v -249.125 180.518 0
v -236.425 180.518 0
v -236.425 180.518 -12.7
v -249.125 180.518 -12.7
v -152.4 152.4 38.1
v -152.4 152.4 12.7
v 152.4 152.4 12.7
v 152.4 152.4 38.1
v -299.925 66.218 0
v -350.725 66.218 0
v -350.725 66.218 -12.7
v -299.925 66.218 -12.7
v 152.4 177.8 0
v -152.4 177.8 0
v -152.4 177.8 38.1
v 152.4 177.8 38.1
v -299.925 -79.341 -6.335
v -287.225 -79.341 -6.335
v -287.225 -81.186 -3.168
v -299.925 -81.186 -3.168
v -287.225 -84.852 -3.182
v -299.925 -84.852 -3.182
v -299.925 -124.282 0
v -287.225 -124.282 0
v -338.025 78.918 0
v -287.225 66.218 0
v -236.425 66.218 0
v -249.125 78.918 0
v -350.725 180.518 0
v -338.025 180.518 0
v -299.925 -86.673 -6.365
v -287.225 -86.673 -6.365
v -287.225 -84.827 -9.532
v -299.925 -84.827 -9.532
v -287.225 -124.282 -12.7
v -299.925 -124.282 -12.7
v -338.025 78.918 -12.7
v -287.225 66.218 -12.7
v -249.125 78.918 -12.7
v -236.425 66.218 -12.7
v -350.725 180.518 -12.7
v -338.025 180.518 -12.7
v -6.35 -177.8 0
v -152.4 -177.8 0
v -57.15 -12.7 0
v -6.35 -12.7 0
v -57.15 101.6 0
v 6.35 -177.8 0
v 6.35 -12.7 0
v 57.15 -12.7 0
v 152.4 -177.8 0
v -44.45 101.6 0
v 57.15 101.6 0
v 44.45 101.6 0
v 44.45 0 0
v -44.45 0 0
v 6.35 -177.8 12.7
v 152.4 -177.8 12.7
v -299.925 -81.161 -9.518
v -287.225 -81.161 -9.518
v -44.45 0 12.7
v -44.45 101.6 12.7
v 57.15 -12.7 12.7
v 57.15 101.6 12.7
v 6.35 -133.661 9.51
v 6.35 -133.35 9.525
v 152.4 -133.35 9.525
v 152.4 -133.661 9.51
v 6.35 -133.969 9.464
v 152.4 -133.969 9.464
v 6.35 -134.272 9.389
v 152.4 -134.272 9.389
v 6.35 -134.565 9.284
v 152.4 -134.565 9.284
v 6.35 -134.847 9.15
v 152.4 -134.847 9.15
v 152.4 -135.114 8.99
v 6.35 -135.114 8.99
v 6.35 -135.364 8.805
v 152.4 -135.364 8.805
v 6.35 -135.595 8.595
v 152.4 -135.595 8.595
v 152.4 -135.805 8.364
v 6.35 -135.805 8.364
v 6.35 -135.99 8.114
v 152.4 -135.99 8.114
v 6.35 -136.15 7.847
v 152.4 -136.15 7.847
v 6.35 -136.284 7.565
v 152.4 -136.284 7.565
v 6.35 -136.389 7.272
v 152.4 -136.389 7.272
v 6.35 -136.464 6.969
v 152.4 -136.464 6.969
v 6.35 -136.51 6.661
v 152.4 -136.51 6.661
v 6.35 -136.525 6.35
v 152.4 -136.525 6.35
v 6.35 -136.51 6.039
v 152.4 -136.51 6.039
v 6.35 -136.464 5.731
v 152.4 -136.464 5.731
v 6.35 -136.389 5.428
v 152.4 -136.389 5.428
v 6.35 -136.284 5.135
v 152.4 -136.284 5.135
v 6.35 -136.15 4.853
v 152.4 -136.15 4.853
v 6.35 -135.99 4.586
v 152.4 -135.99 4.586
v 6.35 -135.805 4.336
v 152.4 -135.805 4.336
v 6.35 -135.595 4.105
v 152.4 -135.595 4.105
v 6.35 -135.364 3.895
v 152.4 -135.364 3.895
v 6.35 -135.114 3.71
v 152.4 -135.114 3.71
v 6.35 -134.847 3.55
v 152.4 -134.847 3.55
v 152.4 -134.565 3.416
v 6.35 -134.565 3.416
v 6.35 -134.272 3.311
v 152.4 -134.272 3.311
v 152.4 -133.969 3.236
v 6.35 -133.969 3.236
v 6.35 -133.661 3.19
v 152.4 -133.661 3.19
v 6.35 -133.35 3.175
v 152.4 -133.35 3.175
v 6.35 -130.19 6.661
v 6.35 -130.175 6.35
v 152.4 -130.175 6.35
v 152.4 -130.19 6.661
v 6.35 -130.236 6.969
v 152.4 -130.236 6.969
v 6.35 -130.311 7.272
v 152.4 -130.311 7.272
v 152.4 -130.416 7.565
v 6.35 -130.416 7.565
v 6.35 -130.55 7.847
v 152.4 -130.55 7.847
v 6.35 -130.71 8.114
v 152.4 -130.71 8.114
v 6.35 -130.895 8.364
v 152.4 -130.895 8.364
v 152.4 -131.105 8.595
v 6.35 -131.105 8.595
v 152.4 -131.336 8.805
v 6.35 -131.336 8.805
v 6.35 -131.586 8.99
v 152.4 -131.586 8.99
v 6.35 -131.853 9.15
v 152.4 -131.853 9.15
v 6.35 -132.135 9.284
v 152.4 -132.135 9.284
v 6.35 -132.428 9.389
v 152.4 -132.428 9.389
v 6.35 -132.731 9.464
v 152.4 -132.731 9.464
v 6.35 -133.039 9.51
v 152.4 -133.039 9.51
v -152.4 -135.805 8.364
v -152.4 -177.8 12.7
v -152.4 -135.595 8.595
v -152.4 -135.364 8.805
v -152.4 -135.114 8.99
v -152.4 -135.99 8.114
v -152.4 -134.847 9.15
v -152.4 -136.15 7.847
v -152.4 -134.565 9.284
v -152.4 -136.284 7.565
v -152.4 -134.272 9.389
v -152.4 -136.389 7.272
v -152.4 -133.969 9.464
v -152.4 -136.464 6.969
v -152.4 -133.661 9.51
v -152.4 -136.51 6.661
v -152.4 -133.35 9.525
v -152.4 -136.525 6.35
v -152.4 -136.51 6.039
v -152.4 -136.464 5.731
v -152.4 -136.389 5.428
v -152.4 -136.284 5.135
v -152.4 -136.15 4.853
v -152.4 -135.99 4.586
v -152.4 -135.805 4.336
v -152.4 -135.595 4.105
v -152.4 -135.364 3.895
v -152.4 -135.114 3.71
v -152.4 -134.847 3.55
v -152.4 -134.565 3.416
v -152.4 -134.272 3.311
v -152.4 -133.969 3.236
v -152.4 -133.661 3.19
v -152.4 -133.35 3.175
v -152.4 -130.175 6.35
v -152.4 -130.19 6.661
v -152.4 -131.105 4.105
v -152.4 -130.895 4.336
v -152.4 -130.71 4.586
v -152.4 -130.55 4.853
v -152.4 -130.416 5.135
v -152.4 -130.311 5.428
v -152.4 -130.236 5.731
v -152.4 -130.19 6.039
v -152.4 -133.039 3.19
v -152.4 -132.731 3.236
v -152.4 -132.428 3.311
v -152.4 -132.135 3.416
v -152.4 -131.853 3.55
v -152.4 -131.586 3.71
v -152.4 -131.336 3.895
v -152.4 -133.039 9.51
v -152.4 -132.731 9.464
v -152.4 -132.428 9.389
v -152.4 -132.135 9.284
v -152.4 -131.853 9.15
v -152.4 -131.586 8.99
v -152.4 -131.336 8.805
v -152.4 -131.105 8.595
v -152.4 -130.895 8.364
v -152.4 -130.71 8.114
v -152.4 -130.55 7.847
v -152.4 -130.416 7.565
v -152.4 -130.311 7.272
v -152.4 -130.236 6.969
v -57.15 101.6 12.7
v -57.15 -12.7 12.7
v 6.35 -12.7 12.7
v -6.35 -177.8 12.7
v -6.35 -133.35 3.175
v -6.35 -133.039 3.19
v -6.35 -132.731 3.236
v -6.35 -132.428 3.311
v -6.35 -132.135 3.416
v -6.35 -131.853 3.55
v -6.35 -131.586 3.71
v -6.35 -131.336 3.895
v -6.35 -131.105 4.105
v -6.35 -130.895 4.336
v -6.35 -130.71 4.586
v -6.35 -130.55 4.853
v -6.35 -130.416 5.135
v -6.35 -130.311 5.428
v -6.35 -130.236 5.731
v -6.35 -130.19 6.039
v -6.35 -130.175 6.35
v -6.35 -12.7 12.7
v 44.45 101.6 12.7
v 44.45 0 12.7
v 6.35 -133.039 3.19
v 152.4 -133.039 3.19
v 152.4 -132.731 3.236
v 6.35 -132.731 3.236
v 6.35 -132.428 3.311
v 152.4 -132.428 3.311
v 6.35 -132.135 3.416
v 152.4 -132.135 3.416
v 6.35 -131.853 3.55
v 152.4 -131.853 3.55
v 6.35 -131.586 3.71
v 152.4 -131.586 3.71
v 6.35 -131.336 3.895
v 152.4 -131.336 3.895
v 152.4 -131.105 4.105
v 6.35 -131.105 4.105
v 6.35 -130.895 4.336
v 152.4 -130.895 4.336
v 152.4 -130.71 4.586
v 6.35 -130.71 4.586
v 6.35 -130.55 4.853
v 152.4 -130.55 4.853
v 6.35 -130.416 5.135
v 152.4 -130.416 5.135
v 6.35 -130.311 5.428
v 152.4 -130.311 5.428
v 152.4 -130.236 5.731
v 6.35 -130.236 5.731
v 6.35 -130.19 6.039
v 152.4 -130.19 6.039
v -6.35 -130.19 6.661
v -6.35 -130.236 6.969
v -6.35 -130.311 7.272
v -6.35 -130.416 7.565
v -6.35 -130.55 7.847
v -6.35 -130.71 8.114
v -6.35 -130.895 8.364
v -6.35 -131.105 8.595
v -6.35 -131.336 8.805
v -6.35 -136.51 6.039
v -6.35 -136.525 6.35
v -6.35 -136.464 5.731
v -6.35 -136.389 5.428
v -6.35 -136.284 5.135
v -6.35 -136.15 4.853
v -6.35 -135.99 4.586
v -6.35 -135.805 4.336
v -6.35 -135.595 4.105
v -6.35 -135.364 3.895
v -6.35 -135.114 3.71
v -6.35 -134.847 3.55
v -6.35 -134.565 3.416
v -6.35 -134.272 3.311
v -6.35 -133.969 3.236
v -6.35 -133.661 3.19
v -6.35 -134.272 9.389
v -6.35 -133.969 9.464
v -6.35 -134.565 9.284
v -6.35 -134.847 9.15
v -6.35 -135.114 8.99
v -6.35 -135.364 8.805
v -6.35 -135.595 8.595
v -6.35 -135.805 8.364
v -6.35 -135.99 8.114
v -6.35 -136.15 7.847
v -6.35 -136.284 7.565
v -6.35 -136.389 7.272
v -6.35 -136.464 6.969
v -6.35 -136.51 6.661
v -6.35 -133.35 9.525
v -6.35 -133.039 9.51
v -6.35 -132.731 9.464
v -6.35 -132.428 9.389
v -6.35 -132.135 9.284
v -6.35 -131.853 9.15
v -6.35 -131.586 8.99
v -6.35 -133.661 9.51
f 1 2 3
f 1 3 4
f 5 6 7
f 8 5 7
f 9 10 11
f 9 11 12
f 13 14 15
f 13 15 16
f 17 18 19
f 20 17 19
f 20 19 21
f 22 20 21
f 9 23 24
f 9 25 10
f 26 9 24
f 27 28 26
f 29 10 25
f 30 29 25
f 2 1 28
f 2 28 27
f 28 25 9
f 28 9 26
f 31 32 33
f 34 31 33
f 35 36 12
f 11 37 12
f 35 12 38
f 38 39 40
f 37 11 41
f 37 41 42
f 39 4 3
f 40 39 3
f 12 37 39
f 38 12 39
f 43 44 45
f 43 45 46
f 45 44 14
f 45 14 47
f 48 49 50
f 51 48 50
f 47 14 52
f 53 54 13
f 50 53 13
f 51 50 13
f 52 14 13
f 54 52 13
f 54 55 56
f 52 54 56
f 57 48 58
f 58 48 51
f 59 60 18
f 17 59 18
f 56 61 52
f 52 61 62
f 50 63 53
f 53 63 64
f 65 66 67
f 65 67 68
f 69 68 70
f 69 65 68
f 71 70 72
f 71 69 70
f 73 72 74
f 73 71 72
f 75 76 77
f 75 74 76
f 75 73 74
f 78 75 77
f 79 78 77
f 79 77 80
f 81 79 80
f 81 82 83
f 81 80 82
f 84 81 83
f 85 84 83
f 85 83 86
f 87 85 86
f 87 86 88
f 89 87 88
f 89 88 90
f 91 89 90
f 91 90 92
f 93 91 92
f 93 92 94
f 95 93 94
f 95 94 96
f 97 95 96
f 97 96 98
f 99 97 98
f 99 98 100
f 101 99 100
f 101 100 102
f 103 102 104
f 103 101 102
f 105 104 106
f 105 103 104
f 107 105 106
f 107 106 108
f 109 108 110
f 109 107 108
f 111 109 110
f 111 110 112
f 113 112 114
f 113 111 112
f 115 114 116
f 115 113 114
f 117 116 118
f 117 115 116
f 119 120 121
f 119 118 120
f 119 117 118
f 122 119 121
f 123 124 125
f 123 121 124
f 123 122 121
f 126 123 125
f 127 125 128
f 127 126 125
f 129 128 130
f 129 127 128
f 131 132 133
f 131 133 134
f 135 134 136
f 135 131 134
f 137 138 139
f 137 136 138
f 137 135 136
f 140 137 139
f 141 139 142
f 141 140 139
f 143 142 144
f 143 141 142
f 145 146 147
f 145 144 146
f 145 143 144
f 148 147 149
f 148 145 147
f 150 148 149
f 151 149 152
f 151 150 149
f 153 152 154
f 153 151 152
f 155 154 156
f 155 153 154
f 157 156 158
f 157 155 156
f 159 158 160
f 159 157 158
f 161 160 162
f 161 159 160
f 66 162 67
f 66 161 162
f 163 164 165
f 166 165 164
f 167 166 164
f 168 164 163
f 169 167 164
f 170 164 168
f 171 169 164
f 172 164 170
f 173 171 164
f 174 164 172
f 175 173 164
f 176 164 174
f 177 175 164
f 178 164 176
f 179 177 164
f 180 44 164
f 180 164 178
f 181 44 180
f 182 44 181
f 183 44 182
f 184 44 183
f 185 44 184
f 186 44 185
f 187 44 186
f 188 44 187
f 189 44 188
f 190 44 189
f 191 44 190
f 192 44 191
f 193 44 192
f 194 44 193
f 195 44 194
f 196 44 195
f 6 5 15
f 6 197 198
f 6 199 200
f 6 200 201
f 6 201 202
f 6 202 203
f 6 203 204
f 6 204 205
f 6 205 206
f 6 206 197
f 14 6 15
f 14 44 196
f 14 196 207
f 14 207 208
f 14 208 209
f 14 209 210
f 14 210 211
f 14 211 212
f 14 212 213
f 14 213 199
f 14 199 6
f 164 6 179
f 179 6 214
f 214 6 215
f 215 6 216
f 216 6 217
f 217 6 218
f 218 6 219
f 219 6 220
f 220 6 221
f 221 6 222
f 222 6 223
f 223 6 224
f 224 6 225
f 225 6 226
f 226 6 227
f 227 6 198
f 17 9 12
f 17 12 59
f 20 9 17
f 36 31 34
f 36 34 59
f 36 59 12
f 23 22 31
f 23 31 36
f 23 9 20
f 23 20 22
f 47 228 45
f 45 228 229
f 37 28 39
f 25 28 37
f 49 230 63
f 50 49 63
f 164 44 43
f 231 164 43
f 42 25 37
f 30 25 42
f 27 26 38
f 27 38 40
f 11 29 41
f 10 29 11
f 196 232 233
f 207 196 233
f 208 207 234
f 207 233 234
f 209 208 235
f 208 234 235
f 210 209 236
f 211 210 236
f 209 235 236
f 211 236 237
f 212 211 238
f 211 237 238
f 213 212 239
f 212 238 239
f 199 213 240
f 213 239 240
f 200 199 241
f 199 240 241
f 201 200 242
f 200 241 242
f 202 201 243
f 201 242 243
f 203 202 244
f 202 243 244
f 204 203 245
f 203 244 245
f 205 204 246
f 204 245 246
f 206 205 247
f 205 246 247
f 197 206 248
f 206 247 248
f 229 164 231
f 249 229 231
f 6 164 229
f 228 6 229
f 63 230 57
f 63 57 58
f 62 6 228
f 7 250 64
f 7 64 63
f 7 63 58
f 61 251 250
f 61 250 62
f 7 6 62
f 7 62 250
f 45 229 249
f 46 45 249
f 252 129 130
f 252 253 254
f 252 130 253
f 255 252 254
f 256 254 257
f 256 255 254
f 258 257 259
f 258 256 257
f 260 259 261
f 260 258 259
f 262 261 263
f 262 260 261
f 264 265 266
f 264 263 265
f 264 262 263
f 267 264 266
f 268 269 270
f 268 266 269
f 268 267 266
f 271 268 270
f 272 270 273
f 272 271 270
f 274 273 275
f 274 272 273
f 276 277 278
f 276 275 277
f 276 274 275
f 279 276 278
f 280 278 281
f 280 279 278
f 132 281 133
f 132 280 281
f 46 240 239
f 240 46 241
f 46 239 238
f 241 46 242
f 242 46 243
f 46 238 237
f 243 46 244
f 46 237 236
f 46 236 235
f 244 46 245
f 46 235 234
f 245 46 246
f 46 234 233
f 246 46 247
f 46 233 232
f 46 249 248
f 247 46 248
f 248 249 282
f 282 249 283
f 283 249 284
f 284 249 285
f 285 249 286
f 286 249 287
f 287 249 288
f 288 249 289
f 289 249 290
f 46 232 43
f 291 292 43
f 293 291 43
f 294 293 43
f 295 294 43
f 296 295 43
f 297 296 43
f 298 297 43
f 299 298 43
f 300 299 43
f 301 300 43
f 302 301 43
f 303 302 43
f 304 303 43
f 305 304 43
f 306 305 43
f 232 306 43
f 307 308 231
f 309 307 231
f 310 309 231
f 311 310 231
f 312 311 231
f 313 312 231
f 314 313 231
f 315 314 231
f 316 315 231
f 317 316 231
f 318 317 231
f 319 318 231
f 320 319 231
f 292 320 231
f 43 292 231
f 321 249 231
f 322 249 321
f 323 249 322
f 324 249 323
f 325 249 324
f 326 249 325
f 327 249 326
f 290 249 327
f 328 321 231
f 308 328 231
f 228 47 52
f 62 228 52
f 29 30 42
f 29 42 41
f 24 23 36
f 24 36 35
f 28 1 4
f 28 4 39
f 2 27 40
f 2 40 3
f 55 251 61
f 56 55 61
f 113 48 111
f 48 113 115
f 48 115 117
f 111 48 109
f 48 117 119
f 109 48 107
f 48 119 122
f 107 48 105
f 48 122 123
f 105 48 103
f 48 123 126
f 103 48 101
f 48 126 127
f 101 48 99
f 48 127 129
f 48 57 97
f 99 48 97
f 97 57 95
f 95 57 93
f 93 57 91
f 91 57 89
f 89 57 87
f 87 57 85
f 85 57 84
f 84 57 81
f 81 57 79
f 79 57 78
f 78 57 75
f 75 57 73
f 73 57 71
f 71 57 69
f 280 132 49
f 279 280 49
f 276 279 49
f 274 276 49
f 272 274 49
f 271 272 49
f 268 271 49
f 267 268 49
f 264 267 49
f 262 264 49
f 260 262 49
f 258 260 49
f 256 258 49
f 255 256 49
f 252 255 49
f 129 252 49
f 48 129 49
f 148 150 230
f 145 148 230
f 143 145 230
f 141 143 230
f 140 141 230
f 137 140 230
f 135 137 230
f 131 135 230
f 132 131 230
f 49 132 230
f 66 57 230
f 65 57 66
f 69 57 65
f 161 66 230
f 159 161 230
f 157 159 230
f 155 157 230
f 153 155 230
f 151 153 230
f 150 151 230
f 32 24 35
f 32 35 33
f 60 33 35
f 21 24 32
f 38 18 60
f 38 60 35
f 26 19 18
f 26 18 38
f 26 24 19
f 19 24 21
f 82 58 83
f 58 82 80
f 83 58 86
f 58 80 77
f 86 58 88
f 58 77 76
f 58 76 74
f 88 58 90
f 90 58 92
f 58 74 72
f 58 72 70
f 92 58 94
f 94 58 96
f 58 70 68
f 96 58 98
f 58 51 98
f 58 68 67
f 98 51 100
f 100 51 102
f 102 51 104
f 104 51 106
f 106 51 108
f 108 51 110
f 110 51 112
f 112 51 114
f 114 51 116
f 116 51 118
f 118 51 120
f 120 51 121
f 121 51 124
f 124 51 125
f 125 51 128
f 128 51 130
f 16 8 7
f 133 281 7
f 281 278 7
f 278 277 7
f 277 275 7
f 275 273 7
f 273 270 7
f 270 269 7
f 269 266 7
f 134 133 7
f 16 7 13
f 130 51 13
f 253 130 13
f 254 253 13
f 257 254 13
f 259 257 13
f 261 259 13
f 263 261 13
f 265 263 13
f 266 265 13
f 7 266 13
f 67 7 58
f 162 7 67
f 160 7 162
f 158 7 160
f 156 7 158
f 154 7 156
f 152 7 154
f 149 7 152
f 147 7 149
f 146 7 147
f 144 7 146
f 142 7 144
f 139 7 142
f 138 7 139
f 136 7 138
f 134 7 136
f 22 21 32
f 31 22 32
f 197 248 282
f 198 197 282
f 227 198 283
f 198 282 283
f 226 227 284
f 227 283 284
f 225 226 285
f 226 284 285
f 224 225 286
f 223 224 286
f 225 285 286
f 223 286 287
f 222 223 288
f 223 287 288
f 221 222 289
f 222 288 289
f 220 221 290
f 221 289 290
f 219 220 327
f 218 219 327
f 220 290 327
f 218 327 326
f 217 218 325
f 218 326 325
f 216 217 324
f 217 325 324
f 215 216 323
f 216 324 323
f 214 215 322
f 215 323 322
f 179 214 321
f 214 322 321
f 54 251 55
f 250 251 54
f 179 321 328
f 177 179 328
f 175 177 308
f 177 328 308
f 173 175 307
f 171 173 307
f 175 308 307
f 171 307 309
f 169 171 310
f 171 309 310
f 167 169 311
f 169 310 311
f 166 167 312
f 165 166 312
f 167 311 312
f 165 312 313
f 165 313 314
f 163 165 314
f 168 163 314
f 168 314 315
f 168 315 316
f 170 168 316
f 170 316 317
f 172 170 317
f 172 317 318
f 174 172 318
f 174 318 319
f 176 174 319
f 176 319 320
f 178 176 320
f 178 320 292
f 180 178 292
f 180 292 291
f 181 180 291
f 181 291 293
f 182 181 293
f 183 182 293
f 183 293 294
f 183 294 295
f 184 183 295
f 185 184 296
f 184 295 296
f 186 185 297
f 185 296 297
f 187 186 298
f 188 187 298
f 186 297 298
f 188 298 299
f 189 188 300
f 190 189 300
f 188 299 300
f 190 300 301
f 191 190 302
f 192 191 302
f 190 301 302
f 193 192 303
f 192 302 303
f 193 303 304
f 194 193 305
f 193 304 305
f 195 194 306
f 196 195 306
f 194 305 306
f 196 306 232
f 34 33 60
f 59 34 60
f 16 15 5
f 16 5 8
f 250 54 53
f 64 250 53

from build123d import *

# Parameters (mm, degrees)
F0_W          = 304.8
F0_H          = 330.2
F1_DEPTH      = 12.7
F2_W          = 12.7
F2_H          = 101.6
F3_DEPTH      = 25.4
F5_DEPTH      = 203.2
F5_DEPTH_BACK = 203.2
F7_DEPTH      = 12.7
F9_DEPTH      = 12.7
F0_H_2        = 25.4
F10_DEPTH     = 38.1


with BuildPart() as f1:
    # F0 (on Top) → F1 (new body)
    with BuildSketch(Plane.XY):
        with Locations((0, -12.7)):
            Rectangle(F0_W, F0_H)
    extrude(amount=F1_DEPTH)

    # F2 (on face) → F3 (cut)
    with BuildSketch(Plane.XY.offset(12.7)):
        Polygon((-6.35, -177.8), (6.35, -177.8), (6.35, -12.7), (6.35, 0), (-6.35, 0), (-6.35, -12.7), align=None)
        Polygon((6.35, 0), (6.35, -12.7), (57.15, -12.7), (57.15, 0), (44.45, 0), align=None)
        Polygon((-57.15, -12.7), (-6.35, -12.7), (-6.35, 0), (-44.45, 0), (-57.15, 0), align=None)
        with Locations((50.8, 50.8)):
            Rectangle(F2_W, F2_H)
        with Locations((-50.8, 50.8)):
            Rectangle(F2_W, F2_H)
    extrude(amount=-F3_DEPTH, mode=Mode.SUBTRACT)

    # F4 (on face) → F5 (cut, two sides)
    with BuildSketch(Plane.YZ.offset(-6.35)) as f5_sk:
        with BuildLine():
            ThreePointArc((-130.1746294843, 6.35), (-131.1046739755, 8.5953260245), (-133.35, 9.5253705157))
            Line((-133.35, 9.5253705157), (-133.35, 3.1746294843))
            ThreePointArc((-133.35, 3.1746294843), (-131.1046739755, 4.1046739755), (-130.1746294843, 6.35))
        make_face()
        with BuildLine():
            Line((-133.35, 3.1746294843), (-133.35, 9.5253705157))
            ThreePointArc((-133.35, 9.5253705157), (-136.5253705157, 6.35), (-133.35, 3.1746294843))
        make_face()
    extrude(amount=-F5_DEPTH, mode=Mode.SUBTRACT)
    extrude(f5_sk.sketch, amount=F5_DEPTH_BACK, mode=Mode.SUBTRACT)

    # F0 (on Top) → F10 (join)
    with BuildSketch(Plane.XY):
        with Locations((0, 165.1)):
            Rectangle(F0_W, F0_H_2)
    extrude(amount=F10_DEPTH)


with BuildPart() as f7:
    # F6 (on Top) → F7 (new body)
    with BuildSketch(Plane.XY):
        Polygon((-299.9245563491, 66.2182163289), (-299.9245563491, -124.2817836711), (-287.2245563491, -124.2817836711), (-287.2245563491, 66.2182163289), (-236.4245563491, 66.2182163289), (-236.4245563491, 180.5182163289), (-249.1245563491, 180.5182163289), (-249.1245563491, 78.9182163289), (-338.0245563491, 78.9182163289), (-338.0245563491, 180.5182163289), (-350.7245563491, 180.5182163289), (-350.7245563491, 66.2182163289), align=None)
    extrude(amount=-F7_DEPTH)

    # F8 (on face) → F9 (cut)
    with BuildSketch(Plane.YZ.offset(-287.2245563491)):
        Polygon((-86.672928993, -6.3645537533), (-84.8272524119, -9.5322518594), (-81.16110709, -9.5176981061), (-79.3406383491, -6.3354462467), (-81.1863149302, -3.1677481406), (-84.8524602522, -3.1823018939), align=None)
    extrude(amount=-F9_DEPTH, mode=Mode.SUBTRACT)


solid = Compound([f1.part, f7.part])
